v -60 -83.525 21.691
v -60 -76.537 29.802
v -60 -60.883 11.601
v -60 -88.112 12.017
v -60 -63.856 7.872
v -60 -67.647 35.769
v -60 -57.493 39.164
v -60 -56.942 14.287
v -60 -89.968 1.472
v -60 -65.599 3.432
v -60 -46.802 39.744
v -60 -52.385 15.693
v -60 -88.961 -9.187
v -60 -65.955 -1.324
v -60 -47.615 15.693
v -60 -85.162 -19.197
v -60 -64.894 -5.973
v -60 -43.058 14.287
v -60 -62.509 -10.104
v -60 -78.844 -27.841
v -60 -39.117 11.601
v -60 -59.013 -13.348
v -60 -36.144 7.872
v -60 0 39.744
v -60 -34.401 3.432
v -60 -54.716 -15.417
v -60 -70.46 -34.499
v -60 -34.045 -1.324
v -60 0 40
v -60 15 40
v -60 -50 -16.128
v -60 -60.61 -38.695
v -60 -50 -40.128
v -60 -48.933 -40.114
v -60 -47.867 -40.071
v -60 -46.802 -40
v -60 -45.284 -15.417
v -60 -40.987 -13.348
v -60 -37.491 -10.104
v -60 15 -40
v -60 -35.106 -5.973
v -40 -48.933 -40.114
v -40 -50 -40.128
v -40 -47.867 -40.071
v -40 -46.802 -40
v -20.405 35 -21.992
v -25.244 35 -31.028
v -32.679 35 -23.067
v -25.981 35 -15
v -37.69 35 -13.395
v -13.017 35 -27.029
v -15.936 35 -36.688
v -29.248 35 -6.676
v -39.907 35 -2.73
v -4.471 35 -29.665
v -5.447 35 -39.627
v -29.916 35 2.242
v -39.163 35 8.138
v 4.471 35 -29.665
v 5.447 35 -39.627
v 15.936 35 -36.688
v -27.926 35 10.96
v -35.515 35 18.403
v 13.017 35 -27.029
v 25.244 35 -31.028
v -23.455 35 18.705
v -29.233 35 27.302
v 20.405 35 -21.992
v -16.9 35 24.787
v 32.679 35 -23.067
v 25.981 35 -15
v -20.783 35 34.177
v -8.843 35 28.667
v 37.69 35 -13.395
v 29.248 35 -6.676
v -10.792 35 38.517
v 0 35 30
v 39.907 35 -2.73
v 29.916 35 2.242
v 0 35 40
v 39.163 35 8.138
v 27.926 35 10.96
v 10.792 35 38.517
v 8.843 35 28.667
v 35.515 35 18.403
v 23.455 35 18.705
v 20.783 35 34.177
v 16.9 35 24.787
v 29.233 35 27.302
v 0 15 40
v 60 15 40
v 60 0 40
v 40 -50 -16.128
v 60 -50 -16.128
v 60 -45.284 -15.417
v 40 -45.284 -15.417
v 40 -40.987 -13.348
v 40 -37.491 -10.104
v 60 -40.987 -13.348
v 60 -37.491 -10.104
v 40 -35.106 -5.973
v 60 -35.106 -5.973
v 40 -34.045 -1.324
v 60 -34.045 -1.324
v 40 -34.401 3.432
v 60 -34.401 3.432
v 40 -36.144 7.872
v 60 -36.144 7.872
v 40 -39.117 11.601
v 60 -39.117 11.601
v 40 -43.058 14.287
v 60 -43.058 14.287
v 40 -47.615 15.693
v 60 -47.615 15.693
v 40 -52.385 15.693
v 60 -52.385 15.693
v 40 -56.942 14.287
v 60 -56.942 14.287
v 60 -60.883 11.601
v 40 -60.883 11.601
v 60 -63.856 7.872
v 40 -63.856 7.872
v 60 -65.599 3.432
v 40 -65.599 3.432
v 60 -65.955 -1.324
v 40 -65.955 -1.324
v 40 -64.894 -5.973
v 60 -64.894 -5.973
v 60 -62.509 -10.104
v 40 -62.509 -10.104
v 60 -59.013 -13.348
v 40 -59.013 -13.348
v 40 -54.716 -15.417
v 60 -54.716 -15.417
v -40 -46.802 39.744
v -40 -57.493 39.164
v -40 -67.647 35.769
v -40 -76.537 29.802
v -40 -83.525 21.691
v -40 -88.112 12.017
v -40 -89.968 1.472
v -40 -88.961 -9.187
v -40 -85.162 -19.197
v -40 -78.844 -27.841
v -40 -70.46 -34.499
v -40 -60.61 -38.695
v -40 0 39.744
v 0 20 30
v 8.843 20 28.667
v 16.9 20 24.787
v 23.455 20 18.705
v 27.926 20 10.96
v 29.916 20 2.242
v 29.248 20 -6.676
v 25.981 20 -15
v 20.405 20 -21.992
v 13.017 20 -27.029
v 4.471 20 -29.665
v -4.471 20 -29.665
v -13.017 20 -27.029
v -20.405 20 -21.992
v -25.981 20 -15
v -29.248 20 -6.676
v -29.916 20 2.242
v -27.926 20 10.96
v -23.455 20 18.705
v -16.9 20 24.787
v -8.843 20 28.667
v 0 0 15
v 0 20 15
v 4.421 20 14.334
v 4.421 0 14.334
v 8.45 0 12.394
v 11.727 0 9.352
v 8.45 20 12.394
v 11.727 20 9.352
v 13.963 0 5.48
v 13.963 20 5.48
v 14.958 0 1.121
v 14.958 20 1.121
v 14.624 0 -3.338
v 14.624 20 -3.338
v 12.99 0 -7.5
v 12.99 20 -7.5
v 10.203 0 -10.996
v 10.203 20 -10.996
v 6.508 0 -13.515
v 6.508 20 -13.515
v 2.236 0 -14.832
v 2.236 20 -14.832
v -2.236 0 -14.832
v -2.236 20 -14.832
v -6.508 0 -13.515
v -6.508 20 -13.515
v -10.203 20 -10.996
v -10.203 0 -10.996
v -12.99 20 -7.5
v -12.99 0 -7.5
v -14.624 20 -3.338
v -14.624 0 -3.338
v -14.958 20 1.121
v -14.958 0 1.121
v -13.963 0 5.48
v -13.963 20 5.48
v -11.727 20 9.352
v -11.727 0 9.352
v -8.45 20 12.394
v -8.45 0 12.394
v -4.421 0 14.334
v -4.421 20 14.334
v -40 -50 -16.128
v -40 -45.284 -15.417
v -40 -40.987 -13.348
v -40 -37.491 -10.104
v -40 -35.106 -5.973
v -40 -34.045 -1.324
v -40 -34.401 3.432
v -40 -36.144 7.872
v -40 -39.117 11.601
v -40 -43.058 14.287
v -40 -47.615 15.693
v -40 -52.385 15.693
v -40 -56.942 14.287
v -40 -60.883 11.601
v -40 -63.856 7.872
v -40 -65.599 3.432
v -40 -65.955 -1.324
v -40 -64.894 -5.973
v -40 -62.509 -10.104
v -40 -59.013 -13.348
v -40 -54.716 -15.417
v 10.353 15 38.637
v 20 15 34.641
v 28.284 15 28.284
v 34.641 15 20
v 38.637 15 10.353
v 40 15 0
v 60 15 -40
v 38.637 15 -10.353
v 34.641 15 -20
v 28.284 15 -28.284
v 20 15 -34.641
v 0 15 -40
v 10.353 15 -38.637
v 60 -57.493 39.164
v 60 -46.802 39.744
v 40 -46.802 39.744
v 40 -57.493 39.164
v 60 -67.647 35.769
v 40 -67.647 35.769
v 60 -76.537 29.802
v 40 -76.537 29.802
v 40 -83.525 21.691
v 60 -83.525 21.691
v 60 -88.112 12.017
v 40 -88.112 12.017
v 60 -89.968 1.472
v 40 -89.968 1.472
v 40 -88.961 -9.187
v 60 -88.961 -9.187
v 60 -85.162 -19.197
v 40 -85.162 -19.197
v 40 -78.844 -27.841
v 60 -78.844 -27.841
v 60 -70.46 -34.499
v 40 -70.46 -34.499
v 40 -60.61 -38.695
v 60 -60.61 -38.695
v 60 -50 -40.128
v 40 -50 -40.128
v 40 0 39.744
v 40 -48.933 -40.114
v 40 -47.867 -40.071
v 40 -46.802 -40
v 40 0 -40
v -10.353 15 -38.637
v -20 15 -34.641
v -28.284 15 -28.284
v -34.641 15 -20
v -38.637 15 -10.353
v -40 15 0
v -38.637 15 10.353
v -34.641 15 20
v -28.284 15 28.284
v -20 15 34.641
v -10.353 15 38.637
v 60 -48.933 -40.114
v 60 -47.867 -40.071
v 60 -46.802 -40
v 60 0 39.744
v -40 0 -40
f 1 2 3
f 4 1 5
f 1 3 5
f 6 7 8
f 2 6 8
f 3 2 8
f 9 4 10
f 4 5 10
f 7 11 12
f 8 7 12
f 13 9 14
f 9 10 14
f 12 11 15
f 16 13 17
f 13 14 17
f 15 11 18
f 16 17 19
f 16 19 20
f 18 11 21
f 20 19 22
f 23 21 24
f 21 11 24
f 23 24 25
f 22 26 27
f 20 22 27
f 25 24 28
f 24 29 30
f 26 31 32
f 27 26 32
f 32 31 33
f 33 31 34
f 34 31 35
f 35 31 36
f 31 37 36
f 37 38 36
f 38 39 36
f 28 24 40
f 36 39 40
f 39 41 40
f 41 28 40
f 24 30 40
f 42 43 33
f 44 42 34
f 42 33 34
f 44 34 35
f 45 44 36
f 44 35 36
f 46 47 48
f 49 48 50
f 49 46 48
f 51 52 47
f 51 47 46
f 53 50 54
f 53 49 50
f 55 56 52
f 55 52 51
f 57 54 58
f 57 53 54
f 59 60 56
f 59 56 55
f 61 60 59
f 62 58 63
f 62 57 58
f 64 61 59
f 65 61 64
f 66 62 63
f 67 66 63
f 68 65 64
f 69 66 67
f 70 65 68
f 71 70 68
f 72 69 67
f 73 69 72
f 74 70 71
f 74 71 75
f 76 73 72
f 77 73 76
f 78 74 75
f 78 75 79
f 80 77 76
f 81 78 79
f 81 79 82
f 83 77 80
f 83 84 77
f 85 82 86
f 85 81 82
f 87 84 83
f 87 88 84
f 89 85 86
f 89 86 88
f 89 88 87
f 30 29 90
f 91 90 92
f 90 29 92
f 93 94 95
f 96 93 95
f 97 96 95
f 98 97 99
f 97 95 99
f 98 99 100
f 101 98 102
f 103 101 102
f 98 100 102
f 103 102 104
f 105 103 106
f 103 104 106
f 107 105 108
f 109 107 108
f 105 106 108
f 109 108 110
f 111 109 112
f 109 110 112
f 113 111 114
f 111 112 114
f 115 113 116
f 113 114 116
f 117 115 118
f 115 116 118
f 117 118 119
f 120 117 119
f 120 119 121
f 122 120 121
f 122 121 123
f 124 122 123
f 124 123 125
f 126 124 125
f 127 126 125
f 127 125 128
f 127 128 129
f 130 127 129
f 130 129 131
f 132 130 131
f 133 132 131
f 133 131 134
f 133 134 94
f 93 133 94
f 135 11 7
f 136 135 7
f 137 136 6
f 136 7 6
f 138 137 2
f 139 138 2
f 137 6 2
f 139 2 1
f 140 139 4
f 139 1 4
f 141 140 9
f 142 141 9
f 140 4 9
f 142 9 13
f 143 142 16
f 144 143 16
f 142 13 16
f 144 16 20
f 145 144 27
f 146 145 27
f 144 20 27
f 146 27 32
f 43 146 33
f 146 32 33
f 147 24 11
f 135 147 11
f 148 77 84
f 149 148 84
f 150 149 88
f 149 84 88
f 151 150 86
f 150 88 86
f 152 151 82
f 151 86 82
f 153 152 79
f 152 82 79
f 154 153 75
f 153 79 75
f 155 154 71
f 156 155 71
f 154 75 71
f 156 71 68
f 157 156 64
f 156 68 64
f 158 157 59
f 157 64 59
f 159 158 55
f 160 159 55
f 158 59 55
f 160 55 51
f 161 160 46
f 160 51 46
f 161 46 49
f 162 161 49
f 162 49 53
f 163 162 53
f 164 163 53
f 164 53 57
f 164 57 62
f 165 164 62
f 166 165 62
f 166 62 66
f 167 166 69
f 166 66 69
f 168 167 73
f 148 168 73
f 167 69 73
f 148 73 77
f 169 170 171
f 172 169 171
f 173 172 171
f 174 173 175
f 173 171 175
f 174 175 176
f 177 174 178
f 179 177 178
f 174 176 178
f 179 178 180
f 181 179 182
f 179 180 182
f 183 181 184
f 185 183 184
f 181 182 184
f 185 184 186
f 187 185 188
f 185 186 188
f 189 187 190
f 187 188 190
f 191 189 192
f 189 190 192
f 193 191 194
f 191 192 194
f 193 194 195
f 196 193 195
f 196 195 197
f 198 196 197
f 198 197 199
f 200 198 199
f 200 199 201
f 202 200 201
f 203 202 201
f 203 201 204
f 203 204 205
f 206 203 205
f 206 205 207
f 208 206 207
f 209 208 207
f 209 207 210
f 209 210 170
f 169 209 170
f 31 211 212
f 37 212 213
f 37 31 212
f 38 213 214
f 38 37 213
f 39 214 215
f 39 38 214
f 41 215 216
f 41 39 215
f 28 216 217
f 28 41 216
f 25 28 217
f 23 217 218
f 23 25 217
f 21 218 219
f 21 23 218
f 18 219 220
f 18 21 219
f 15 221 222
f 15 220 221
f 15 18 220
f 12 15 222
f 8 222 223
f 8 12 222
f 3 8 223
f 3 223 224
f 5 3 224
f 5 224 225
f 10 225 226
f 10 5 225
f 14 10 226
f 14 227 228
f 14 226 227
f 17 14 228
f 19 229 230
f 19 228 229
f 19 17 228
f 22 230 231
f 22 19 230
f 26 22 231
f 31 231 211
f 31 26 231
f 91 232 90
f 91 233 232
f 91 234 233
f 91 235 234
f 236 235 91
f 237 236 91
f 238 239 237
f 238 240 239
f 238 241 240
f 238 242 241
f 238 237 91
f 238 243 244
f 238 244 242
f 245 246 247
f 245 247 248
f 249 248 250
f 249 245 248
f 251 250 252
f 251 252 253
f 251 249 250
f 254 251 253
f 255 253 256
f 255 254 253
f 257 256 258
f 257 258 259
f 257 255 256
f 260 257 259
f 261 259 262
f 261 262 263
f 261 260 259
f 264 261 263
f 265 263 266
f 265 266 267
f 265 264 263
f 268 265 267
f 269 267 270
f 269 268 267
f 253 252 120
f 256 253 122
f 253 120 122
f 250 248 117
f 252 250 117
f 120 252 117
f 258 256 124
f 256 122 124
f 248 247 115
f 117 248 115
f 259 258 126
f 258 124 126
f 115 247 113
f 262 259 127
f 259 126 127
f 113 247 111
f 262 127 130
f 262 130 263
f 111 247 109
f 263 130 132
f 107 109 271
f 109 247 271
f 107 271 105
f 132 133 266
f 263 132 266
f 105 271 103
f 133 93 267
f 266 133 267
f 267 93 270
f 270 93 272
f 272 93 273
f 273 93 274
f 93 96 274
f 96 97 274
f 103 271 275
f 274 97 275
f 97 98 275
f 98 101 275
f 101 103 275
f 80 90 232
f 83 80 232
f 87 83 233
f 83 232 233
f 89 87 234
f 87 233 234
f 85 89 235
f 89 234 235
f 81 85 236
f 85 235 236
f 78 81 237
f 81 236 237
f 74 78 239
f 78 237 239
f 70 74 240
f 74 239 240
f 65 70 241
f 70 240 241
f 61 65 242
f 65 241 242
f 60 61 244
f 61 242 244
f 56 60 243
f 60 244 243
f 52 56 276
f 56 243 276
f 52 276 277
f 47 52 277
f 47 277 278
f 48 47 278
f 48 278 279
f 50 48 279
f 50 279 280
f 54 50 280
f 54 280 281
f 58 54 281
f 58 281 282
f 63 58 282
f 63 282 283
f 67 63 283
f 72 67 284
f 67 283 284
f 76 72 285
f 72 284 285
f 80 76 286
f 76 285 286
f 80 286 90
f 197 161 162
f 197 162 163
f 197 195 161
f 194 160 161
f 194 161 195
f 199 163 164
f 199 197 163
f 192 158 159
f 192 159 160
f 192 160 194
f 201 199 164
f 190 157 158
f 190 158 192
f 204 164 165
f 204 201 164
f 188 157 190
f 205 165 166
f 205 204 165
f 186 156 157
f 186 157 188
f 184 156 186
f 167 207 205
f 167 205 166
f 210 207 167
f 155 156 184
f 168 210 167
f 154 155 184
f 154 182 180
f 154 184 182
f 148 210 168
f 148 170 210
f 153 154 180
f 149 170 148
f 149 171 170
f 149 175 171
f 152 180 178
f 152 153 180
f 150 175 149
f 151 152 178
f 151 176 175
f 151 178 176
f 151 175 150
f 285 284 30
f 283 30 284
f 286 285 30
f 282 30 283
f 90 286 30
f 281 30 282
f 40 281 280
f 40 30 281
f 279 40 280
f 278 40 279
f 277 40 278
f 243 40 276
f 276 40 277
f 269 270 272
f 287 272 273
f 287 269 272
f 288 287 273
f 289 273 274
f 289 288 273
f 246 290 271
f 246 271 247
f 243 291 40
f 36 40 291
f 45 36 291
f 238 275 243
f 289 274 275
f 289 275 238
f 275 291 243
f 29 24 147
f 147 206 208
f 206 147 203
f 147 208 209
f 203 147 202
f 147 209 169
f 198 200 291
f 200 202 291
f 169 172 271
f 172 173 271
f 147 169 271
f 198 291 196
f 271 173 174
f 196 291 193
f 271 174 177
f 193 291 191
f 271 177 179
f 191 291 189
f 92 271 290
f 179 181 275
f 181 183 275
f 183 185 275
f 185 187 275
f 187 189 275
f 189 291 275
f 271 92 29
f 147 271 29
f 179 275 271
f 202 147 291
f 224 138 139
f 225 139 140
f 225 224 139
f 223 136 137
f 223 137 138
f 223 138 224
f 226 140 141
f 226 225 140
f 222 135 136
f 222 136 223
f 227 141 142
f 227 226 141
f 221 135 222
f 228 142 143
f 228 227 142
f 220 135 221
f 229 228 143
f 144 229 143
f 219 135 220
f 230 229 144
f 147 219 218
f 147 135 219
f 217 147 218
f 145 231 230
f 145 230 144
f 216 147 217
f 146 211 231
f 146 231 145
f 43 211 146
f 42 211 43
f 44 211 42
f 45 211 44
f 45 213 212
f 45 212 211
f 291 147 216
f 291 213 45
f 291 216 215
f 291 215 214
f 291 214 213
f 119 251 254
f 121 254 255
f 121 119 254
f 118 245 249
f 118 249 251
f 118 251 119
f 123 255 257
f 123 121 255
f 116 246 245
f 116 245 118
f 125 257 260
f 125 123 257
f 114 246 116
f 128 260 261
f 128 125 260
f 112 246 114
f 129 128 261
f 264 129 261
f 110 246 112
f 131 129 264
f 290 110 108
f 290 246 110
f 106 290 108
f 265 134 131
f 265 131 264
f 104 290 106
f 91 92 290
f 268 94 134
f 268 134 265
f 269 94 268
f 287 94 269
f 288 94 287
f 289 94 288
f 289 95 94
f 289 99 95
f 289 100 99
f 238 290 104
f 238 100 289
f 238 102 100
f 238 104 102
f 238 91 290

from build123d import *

# Parameters (mm, degrees)
SKETCH1_W           = 120
SKETCH1_H           = 80
BOSS_EXTRUDE1_DEPTH = 15
SKETCH2_R           = 40
BOSS_EXTRUDE2_DEPTH = 20
SKETCH3_R           = 30
CUT_EXTRUDE1_DEPTH  = 15
SKETCH4_R           = 15
CUT_EXTRUDE2_DEPTH  = 75.833147735
BOSS_EXTRUDE3_DEPTH = 20
SKETCH6_R           = 16
CUT_EXTRUDE3_DEPTH  = 156.274782914


with BuildPart() as part:
    # Sketch1 → Boss-Extrude1 (new body)
    with BuildSketch(Plane(origin=(0, 0, 0), x_dir=(1, 0, 0), z_dir=(0, 1, 0))):
        Rectangle(SKETCH1_W, SKETCH1_H)
    extrude(amount=BOSS_EXTRUDE1_DEPTH)

    # Sketch2 → Boss-Extrude2 (add)
    with BuildSketch(Plane(origin=(0, 15, 0), x_dir=(1, 0, 0), z_dir=(0, 1, 0))):
        with Locations(Location((0, 0, 0), (0, 0, 270))):
            Circle(SKETCH2_R)
    extrude(amount=BOSS_EXTRUDE2_DEPTH)

    # Sketch3 → Cut-Extrude1 (cut)
    with BuildSketch(Plane(origin=(0, 35, 0), x_dir=(1, 0, 0), z_dir=(0, 1, 0))):
        with Locations(Location((0, 0, 0), (0, 0, 270))):
            Circle(SKETCH3_R)
    extrude(amount=-CUT_EXTRUDE1_DEPTH, mode=Mode.SUBTRACT)

    # Sketch4 → Cut-Extrude2 (cut, through all)
    with BuildSketch(Plane(origin=(0, 20, 0), x_dir=(1, 0, 0), z_dir=(0, 1, 0))):
        with Locations(Location((0, 0, 0), (0, 0, 270))):
            Circle(SKETCH4_R)
    extrude(amount=-CUT_EXTRUDE2_DEPTH, mode=Mode.SUBTRACT)

    # Sketch5 → Boss-Extrude3 (add)
    with BuildSketch(Plane(origin=(60, 0, 0), x_dir=(0, 0, -1), z_dir=(1, 0, 0))):
        with BuildLine():
            Line((40, -46.802277462), (40, 0))
            Line((40, 0), (-39.743954519, 0))
            Line((-39.743954519, 0), (-39.743954519, -46.802277462))
            ThreePointArc((-39.743954519, -46.802277462), (0.128022741, -10), (40, -46.802277462))
        make_face()
        with BuildLine():
            ThreePointArc((40.128022741, -50), (40.096004241, -48.399857877), (40, -46.802277462))
            Line((40, -46.802277462), (40, -50))
            Line((40, -50), (-39.743954519, -50))
            Line((-39.743954519, -50), (-39.743954519, -46.802277462))
            ThreePointArc((-39.743954519, -46.802277462), (-1.472119382, -89.9679815), (40.128022741, -50))
        make_face()
        with BuildLine():
            Line((40, -50), (40, -46.802277462))
            ThreePointArc((40, -46.802277462), (0.128022741, -10), (-39.743954519, -46.802277462))
            Line((-39.743954519, -46.802277462), (-39.743954519, -50))
            Line((-39.743954519, -50), (40, -50))
        make_face()
    boss_extrude3 = extrude(amount=-BOSS_EXTRUDE3_DEPTH)

    # Sketch6 → Cut-Extrude3 (cut, through all)
    with BuildSketch(Plane(origin=(60, 0, 0), x_dir=(0, 0, -1), z_dir=(1, 0, 0))):
        with Locations((0.128022741, -50)):
            Circle(SKETCH6_R)
    cut_extrude3 = extrude(amount=-CUT_EXTRUDE3_DEPTH, mode=Mode.SUBTRACT)

    # Mirror2: Boss-Extrude3, Cut-Extrude3 across plane
    add(boss_extrude3.mirror(Plane(origin=(0, 0, 0), x_dir=(0, 0, 1), z_dir=(1, 0, 0))))
    add(cut_extrude3.mirror(Plane(origin=(0, 0, 0), x_dir=(0, 0, 1), z_dir=(1, 0, 0))), mode=Mode.SUBTRACT)


solid = part.part
